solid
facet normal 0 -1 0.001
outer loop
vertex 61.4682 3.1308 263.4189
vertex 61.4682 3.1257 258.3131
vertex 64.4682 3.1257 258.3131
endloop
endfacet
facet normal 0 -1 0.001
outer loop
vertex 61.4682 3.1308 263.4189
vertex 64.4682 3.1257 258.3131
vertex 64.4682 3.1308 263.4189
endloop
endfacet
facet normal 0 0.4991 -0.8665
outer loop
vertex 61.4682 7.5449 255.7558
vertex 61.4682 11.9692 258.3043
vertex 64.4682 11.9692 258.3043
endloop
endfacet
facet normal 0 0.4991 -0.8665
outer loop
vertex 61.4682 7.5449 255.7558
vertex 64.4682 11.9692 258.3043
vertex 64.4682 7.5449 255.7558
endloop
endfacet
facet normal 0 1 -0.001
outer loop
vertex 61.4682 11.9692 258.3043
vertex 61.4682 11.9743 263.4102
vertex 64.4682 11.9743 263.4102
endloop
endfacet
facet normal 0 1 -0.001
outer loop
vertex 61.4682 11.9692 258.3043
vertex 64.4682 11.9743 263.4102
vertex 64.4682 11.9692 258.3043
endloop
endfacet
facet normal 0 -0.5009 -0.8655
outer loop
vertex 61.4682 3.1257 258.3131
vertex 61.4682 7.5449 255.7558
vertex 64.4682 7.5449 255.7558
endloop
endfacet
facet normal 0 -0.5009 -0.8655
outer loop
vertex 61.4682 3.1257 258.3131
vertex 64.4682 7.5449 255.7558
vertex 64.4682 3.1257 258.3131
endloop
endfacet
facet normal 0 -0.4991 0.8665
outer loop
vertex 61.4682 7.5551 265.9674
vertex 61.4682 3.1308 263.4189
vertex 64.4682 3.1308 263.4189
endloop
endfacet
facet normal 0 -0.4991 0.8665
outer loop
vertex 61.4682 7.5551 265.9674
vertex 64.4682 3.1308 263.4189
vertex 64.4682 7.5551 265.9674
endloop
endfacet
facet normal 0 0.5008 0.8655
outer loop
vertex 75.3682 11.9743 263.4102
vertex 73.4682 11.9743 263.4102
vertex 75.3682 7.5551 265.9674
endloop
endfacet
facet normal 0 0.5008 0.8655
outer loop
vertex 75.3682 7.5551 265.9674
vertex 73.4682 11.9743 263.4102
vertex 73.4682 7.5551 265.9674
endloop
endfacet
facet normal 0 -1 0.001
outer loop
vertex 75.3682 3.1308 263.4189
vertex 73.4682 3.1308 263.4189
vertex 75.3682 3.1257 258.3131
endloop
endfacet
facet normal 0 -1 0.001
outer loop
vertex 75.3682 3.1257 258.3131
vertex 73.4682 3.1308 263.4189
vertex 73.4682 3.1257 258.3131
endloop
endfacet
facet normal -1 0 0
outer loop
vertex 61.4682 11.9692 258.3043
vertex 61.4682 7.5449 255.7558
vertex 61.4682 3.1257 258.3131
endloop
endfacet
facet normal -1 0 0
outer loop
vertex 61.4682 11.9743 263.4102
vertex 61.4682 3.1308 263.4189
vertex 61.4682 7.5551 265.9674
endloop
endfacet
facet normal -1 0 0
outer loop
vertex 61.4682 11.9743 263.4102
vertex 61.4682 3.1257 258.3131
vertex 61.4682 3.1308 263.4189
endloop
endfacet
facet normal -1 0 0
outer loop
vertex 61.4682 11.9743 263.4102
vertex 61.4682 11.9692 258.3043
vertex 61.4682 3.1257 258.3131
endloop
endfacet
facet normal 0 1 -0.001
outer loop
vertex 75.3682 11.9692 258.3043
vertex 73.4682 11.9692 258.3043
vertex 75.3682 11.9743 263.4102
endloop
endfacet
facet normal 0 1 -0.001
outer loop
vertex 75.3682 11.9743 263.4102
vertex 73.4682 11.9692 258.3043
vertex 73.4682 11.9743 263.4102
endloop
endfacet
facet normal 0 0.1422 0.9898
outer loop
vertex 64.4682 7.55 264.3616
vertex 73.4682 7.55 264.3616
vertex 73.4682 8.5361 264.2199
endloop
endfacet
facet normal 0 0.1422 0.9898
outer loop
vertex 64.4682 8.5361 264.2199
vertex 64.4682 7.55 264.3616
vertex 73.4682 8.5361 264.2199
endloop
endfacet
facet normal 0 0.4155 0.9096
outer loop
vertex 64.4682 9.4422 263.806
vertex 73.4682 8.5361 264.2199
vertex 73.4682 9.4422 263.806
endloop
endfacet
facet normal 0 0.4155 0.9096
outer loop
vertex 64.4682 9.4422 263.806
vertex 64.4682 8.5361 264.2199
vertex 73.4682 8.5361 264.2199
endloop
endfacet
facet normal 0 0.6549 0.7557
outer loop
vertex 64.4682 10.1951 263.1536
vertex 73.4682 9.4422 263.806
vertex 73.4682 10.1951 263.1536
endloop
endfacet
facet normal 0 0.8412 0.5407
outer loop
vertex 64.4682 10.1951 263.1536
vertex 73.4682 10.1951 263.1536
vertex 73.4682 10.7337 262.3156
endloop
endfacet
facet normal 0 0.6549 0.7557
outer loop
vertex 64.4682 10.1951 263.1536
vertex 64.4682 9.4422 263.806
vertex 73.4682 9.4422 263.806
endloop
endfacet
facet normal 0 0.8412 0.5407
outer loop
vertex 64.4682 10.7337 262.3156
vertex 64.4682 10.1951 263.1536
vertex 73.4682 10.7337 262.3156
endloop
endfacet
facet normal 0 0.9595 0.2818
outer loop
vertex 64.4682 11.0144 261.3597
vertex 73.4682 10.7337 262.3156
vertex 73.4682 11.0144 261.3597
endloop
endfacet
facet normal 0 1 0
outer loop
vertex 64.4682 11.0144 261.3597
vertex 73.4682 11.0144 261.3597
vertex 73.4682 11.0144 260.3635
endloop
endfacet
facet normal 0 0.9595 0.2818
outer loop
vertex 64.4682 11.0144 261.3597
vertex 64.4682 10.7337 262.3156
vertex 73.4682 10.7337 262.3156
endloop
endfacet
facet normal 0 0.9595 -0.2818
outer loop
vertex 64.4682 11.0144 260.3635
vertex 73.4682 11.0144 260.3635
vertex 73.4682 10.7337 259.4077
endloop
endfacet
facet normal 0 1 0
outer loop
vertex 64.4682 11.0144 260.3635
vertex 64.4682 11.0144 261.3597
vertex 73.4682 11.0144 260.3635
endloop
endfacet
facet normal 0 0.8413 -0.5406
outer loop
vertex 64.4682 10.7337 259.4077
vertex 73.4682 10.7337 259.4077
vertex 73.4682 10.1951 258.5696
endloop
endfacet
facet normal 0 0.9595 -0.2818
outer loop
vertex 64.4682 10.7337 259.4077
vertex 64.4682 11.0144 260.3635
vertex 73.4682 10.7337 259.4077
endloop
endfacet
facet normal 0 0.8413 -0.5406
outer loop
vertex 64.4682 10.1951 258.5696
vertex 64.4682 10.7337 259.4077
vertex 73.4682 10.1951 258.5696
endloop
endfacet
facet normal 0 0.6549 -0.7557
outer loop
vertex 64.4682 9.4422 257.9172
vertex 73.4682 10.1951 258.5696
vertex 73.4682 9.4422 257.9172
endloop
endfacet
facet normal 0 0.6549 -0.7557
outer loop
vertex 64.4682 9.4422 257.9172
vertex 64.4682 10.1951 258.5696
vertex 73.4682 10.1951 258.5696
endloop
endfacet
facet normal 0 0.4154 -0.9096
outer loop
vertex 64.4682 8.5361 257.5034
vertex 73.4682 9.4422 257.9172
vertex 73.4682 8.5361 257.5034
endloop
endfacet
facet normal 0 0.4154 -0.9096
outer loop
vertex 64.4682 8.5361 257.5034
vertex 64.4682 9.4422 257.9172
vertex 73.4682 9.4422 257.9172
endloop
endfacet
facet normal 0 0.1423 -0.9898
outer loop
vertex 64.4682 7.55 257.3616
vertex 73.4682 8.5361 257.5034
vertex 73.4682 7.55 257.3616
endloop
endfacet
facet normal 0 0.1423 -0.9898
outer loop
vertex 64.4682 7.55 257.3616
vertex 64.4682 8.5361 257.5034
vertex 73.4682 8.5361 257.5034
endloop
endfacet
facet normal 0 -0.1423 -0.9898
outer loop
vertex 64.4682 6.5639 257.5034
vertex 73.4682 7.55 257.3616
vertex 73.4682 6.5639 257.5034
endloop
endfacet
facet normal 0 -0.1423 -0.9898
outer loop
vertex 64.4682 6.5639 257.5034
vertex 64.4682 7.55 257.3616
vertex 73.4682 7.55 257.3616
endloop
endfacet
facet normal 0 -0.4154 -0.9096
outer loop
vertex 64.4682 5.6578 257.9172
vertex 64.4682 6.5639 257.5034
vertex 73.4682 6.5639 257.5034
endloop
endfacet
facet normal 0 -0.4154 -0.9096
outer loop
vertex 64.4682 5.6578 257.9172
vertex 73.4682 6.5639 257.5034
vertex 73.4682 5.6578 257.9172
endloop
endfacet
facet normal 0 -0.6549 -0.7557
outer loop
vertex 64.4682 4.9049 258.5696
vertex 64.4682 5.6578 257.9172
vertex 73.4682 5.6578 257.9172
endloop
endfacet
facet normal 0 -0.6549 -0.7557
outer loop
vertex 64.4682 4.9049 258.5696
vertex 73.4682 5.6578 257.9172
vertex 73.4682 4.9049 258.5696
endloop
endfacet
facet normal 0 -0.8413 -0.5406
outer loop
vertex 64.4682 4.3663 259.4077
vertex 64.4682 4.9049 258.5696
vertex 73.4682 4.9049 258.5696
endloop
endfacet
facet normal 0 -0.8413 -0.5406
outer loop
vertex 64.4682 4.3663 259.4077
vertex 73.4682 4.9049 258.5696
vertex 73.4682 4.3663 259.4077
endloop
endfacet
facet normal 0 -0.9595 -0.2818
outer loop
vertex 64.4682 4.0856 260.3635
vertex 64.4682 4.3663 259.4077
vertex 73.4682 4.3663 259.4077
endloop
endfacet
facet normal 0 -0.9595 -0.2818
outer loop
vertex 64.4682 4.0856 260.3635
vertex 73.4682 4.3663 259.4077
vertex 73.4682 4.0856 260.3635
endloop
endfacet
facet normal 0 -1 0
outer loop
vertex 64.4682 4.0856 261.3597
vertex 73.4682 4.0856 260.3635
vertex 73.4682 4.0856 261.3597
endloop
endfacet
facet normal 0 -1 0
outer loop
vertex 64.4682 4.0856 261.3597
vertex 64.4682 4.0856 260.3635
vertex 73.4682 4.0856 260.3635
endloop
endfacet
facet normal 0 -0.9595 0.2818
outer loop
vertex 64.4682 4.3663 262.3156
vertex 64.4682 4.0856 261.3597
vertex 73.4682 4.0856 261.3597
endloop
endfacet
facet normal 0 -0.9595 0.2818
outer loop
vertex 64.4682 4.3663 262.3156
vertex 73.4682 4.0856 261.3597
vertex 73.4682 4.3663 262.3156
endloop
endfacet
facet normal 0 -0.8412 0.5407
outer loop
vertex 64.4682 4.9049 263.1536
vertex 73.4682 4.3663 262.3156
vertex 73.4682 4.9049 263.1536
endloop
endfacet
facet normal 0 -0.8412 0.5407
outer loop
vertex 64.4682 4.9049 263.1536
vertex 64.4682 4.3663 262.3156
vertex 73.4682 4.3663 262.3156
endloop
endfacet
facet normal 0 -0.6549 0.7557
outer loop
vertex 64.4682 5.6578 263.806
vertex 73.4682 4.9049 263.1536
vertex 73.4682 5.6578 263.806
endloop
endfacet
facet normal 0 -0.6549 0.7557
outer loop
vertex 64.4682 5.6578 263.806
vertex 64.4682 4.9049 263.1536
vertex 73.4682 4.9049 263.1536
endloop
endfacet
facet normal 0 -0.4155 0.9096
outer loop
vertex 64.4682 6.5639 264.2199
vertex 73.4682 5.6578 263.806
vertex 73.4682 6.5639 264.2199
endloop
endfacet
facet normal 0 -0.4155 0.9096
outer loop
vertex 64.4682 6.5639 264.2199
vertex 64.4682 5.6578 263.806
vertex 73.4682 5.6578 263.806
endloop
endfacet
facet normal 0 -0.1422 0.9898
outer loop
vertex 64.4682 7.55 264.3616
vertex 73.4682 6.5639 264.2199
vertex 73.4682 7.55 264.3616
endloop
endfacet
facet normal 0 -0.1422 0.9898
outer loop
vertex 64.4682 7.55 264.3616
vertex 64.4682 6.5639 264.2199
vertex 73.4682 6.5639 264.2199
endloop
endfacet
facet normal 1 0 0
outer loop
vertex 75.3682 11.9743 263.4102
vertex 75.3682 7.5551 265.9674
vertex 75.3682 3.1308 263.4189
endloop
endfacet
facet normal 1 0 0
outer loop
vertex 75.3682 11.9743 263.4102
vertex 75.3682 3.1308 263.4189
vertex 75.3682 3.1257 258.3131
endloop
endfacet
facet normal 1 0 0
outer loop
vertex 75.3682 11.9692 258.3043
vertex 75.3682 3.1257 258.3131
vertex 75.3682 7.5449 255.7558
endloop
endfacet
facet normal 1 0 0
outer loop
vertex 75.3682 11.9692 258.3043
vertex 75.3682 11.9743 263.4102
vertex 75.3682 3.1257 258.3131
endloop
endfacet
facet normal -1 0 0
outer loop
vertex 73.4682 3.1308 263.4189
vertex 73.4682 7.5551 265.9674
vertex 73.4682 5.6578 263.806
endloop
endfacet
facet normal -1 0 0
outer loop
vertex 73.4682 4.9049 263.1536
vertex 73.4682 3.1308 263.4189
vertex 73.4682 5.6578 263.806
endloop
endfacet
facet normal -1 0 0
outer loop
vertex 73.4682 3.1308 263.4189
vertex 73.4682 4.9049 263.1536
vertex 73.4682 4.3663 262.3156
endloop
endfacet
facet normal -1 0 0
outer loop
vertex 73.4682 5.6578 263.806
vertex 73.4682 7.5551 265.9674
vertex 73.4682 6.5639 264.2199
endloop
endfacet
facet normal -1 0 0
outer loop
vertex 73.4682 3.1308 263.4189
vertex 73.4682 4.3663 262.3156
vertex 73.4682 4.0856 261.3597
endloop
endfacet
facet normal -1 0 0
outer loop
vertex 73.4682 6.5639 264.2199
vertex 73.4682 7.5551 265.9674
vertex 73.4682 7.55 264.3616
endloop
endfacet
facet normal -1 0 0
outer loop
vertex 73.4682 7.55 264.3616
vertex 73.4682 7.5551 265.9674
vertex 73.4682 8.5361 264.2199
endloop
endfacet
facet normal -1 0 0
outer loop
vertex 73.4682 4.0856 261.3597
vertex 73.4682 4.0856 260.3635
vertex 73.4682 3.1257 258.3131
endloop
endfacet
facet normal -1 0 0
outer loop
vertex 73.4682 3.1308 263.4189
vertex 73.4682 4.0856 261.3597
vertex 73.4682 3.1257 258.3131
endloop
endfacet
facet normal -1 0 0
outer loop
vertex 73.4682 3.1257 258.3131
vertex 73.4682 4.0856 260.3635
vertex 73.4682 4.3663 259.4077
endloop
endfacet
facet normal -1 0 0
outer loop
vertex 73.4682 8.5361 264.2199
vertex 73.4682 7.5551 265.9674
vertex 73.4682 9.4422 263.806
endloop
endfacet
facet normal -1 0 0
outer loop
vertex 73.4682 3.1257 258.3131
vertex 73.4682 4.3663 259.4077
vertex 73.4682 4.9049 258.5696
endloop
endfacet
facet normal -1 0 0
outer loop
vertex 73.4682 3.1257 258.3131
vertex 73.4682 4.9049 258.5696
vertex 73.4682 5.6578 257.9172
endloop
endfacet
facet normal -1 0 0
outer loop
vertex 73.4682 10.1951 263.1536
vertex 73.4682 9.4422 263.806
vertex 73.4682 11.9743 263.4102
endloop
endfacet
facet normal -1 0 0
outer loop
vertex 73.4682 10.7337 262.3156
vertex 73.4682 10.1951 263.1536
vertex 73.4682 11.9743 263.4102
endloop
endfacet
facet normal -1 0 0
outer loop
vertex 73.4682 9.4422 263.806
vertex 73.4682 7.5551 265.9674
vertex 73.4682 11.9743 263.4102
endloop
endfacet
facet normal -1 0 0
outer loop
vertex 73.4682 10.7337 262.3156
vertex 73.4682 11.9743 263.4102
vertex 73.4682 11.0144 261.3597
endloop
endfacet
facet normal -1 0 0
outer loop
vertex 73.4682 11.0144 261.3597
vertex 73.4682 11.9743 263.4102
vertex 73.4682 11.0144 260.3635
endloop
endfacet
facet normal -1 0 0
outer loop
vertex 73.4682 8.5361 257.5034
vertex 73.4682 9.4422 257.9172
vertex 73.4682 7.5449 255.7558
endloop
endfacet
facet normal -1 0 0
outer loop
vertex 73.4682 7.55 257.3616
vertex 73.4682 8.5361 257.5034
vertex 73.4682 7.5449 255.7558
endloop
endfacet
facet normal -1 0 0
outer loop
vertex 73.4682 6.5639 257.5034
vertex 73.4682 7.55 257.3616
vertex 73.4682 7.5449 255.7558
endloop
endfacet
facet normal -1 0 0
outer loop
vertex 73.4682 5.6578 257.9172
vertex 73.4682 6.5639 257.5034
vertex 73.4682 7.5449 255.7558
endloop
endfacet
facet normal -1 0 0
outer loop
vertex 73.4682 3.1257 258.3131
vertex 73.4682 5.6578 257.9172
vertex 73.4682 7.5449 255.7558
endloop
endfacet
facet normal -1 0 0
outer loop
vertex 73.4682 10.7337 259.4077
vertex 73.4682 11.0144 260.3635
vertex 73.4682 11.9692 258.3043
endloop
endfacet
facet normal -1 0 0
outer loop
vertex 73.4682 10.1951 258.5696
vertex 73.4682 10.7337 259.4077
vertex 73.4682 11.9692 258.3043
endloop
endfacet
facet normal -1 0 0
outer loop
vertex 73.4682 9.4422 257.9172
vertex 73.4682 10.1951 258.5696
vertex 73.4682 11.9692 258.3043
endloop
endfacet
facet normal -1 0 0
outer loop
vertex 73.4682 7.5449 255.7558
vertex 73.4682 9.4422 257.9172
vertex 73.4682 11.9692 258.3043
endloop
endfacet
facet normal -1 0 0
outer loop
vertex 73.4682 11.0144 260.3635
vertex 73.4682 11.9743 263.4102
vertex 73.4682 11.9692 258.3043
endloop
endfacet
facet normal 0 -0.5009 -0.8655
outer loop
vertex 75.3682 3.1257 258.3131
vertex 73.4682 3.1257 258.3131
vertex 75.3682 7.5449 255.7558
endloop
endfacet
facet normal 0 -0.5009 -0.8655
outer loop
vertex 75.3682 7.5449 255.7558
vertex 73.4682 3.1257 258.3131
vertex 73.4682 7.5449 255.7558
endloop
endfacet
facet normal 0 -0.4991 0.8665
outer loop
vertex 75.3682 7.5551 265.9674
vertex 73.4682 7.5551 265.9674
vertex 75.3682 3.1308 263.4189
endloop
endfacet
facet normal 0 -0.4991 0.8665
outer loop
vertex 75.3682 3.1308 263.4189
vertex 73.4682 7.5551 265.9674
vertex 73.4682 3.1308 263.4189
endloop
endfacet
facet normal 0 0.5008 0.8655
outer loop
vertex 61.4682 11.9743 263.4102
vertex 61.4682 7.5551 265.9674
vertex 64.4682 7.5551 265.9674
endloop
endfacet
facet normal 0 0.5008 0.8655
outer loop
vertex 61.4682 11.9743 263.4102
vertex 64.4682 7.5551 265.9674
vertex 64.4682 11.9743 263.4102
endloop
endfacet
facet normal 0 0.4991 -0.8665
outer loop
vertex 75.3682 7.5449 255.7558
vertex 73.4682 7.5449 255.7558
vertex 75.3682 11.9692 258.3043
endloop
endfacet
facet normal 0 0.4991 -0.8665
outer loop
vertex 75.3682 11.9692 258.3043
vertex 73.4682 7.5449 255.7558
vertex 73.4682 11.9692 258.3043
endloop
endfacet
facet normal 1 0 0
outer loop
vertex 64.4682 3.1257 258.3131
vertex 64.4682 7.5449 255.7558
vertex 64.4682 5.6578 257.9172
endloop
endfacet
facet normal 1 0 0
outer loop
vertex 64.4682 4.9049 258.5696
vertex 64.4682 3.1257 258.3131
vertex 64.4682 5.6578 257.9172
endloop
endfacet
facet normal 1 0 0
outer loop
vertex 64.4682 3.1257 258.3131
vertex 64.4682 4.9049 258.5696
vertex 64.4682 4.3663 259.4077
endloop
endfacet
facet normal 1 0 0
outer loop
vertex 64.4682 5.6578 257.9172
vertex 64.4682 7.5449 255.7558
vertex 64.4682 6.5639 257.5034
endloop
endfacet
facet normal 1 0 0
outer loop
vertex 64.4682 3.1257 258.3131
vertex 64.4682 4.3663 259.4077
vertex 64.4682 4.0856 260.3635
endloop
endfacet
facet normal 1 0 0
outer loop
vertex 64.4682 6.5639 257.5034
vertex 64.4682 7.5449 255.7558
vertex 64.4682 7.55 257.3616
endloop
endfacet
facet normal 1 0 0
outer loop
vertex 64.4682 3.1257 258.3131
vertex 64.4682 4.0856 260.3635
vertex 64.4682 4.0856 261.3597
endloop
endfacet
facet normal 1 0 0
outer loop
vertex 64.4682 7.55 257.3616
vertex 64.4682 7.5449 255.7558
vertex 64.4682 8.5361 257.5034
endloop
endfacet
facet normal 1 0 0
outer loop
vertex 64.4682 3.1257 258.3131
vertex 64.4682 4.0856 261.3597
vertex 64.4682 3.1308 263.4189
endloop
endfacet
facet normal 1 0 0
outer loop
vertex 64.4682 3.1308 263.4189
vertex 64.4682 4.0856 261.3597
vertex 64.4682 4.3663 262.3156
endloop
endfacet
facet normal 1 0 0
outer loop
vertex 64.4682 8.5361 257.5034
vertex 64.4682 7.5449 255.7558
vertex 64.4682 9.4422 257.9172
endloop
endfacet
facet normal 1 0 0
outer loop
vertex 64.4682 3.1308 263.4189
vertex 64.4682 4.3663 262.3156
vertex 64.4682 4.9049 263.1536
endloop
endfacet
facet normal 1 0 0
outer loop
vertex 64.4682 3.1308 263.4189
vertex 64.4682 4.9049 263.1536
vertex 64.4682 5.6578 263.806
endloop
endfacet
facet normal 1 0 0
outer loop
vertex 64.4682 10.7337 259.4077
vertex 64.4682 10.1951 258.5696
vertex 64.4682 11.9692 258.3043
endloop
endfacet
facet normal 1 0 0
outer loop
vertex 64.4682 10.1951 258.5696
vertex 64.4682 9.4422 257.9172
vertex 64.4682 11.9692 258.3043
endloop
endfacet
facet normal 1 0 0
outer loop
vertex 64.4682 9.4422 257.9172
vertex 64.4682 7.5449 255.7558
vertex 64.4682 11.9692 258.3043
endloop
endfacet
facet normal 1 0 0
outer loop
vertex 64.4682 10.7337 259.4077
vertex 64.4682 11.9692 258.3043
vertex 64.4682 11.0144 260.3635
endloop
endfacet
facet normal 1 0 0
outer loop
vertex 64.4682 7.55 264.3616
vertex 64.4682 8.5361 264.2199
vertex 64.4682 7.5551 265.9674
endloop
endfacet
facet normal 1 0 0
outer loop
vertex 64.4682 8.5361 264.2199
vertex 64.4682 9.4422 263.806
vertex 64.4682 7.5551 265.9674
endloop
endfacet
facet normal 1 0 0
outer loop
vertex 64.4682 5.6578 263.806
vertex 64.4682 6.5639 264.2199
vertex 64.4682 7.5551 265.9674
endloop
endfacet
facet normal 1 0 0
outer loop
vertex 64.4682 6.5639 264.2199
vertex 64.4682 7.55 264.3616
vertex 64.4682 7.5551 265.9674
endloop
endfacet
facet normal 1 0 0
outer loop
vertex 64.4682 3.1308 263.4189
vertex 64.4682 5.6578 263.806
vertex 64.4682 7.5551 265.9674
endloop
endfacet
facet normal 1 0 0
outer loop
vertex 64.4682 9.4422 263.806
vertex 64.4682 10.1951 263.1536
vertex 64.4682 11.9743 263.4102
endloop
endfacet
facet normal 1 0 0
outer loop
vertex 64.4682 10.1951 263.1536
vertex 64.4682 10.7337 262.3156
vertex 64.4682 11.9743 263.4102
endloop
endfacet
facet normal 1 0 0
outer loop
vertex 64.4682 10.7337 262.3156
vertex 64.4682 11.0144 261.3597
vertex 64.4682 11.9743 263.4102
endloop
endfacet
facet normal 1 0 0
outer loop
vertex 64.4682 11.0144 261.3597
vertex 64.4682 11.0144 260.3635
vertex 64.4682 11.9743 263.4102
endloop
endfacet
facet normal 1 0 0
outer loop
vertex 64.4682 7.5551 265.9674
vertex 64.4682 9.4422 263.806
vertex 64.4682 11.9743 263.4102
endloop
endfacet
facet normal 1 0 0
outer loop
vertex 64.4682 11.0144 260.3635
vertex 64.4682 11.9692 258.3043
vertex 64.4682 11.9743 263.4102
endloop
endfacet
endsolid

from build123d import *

# Parameters (mm, degrees)
SKETCH1_R                = 3.5
BOSS_EXTRUDE1_DEPTH      = 3
BOSS_EXTRUDE1_DEPTH_BACK = 9
BOSS_EXTRUDE2_DEPTH      = 3
BOSS_EXTRUDE3_DEPTH      = 1.9


with BuildPart() as part:
    # Sketch1 → Boss-Extrude1 (new body, two sides)
    with BuildSketch(Plane.ZY.offset(-64.468173267)) as boss_extrude1_sk:
        with Locations((260.861627804, 7.55)):
            Circle(SKETCH1_R)
    extrude(amount=BOSS_EXTRUDE1_DEPTH)
    extrude(boss_extrude1_sk.sketch, amount=-BOSS_EXTRUDE1_DEPTH_BACK)

    # Sketch2 → Boss-Extrude2 (add)
    with BuildSketch(Plane.ZY.offset(-61.468173267)):
        Polygon((263.418922822, 3.130759561), (265.967449799, 7.555062231), (263.410154781, 11.974302669), (258.304332787, 11.969240439), (255.75580581, 7.544937769), (258.313100828, 3.125697331), align=None)
    extrude(amount=-BOSS_EXTRUDE2_DEPTH)

    # Sketch3 → Boss-Extrude3 (add)
    with BuildSketch(Plane(origin=(73.468173267, 0, 0), x_dir=(0, 0, -1), z_dir=(1, 0, 0))):
        Polygon((-258.313100828, 3.125697331), (-255.75580581, 7.544937769), (-258.304332787, 11.969240439), (-263.410154781, 11.974302669), (-265.967449799, 7.555062231), (-263.418922822, 3.130759561), align=None)
    extrude(amount=BOSS_EXTRUDE3_DEPTH)


solid = part.part
